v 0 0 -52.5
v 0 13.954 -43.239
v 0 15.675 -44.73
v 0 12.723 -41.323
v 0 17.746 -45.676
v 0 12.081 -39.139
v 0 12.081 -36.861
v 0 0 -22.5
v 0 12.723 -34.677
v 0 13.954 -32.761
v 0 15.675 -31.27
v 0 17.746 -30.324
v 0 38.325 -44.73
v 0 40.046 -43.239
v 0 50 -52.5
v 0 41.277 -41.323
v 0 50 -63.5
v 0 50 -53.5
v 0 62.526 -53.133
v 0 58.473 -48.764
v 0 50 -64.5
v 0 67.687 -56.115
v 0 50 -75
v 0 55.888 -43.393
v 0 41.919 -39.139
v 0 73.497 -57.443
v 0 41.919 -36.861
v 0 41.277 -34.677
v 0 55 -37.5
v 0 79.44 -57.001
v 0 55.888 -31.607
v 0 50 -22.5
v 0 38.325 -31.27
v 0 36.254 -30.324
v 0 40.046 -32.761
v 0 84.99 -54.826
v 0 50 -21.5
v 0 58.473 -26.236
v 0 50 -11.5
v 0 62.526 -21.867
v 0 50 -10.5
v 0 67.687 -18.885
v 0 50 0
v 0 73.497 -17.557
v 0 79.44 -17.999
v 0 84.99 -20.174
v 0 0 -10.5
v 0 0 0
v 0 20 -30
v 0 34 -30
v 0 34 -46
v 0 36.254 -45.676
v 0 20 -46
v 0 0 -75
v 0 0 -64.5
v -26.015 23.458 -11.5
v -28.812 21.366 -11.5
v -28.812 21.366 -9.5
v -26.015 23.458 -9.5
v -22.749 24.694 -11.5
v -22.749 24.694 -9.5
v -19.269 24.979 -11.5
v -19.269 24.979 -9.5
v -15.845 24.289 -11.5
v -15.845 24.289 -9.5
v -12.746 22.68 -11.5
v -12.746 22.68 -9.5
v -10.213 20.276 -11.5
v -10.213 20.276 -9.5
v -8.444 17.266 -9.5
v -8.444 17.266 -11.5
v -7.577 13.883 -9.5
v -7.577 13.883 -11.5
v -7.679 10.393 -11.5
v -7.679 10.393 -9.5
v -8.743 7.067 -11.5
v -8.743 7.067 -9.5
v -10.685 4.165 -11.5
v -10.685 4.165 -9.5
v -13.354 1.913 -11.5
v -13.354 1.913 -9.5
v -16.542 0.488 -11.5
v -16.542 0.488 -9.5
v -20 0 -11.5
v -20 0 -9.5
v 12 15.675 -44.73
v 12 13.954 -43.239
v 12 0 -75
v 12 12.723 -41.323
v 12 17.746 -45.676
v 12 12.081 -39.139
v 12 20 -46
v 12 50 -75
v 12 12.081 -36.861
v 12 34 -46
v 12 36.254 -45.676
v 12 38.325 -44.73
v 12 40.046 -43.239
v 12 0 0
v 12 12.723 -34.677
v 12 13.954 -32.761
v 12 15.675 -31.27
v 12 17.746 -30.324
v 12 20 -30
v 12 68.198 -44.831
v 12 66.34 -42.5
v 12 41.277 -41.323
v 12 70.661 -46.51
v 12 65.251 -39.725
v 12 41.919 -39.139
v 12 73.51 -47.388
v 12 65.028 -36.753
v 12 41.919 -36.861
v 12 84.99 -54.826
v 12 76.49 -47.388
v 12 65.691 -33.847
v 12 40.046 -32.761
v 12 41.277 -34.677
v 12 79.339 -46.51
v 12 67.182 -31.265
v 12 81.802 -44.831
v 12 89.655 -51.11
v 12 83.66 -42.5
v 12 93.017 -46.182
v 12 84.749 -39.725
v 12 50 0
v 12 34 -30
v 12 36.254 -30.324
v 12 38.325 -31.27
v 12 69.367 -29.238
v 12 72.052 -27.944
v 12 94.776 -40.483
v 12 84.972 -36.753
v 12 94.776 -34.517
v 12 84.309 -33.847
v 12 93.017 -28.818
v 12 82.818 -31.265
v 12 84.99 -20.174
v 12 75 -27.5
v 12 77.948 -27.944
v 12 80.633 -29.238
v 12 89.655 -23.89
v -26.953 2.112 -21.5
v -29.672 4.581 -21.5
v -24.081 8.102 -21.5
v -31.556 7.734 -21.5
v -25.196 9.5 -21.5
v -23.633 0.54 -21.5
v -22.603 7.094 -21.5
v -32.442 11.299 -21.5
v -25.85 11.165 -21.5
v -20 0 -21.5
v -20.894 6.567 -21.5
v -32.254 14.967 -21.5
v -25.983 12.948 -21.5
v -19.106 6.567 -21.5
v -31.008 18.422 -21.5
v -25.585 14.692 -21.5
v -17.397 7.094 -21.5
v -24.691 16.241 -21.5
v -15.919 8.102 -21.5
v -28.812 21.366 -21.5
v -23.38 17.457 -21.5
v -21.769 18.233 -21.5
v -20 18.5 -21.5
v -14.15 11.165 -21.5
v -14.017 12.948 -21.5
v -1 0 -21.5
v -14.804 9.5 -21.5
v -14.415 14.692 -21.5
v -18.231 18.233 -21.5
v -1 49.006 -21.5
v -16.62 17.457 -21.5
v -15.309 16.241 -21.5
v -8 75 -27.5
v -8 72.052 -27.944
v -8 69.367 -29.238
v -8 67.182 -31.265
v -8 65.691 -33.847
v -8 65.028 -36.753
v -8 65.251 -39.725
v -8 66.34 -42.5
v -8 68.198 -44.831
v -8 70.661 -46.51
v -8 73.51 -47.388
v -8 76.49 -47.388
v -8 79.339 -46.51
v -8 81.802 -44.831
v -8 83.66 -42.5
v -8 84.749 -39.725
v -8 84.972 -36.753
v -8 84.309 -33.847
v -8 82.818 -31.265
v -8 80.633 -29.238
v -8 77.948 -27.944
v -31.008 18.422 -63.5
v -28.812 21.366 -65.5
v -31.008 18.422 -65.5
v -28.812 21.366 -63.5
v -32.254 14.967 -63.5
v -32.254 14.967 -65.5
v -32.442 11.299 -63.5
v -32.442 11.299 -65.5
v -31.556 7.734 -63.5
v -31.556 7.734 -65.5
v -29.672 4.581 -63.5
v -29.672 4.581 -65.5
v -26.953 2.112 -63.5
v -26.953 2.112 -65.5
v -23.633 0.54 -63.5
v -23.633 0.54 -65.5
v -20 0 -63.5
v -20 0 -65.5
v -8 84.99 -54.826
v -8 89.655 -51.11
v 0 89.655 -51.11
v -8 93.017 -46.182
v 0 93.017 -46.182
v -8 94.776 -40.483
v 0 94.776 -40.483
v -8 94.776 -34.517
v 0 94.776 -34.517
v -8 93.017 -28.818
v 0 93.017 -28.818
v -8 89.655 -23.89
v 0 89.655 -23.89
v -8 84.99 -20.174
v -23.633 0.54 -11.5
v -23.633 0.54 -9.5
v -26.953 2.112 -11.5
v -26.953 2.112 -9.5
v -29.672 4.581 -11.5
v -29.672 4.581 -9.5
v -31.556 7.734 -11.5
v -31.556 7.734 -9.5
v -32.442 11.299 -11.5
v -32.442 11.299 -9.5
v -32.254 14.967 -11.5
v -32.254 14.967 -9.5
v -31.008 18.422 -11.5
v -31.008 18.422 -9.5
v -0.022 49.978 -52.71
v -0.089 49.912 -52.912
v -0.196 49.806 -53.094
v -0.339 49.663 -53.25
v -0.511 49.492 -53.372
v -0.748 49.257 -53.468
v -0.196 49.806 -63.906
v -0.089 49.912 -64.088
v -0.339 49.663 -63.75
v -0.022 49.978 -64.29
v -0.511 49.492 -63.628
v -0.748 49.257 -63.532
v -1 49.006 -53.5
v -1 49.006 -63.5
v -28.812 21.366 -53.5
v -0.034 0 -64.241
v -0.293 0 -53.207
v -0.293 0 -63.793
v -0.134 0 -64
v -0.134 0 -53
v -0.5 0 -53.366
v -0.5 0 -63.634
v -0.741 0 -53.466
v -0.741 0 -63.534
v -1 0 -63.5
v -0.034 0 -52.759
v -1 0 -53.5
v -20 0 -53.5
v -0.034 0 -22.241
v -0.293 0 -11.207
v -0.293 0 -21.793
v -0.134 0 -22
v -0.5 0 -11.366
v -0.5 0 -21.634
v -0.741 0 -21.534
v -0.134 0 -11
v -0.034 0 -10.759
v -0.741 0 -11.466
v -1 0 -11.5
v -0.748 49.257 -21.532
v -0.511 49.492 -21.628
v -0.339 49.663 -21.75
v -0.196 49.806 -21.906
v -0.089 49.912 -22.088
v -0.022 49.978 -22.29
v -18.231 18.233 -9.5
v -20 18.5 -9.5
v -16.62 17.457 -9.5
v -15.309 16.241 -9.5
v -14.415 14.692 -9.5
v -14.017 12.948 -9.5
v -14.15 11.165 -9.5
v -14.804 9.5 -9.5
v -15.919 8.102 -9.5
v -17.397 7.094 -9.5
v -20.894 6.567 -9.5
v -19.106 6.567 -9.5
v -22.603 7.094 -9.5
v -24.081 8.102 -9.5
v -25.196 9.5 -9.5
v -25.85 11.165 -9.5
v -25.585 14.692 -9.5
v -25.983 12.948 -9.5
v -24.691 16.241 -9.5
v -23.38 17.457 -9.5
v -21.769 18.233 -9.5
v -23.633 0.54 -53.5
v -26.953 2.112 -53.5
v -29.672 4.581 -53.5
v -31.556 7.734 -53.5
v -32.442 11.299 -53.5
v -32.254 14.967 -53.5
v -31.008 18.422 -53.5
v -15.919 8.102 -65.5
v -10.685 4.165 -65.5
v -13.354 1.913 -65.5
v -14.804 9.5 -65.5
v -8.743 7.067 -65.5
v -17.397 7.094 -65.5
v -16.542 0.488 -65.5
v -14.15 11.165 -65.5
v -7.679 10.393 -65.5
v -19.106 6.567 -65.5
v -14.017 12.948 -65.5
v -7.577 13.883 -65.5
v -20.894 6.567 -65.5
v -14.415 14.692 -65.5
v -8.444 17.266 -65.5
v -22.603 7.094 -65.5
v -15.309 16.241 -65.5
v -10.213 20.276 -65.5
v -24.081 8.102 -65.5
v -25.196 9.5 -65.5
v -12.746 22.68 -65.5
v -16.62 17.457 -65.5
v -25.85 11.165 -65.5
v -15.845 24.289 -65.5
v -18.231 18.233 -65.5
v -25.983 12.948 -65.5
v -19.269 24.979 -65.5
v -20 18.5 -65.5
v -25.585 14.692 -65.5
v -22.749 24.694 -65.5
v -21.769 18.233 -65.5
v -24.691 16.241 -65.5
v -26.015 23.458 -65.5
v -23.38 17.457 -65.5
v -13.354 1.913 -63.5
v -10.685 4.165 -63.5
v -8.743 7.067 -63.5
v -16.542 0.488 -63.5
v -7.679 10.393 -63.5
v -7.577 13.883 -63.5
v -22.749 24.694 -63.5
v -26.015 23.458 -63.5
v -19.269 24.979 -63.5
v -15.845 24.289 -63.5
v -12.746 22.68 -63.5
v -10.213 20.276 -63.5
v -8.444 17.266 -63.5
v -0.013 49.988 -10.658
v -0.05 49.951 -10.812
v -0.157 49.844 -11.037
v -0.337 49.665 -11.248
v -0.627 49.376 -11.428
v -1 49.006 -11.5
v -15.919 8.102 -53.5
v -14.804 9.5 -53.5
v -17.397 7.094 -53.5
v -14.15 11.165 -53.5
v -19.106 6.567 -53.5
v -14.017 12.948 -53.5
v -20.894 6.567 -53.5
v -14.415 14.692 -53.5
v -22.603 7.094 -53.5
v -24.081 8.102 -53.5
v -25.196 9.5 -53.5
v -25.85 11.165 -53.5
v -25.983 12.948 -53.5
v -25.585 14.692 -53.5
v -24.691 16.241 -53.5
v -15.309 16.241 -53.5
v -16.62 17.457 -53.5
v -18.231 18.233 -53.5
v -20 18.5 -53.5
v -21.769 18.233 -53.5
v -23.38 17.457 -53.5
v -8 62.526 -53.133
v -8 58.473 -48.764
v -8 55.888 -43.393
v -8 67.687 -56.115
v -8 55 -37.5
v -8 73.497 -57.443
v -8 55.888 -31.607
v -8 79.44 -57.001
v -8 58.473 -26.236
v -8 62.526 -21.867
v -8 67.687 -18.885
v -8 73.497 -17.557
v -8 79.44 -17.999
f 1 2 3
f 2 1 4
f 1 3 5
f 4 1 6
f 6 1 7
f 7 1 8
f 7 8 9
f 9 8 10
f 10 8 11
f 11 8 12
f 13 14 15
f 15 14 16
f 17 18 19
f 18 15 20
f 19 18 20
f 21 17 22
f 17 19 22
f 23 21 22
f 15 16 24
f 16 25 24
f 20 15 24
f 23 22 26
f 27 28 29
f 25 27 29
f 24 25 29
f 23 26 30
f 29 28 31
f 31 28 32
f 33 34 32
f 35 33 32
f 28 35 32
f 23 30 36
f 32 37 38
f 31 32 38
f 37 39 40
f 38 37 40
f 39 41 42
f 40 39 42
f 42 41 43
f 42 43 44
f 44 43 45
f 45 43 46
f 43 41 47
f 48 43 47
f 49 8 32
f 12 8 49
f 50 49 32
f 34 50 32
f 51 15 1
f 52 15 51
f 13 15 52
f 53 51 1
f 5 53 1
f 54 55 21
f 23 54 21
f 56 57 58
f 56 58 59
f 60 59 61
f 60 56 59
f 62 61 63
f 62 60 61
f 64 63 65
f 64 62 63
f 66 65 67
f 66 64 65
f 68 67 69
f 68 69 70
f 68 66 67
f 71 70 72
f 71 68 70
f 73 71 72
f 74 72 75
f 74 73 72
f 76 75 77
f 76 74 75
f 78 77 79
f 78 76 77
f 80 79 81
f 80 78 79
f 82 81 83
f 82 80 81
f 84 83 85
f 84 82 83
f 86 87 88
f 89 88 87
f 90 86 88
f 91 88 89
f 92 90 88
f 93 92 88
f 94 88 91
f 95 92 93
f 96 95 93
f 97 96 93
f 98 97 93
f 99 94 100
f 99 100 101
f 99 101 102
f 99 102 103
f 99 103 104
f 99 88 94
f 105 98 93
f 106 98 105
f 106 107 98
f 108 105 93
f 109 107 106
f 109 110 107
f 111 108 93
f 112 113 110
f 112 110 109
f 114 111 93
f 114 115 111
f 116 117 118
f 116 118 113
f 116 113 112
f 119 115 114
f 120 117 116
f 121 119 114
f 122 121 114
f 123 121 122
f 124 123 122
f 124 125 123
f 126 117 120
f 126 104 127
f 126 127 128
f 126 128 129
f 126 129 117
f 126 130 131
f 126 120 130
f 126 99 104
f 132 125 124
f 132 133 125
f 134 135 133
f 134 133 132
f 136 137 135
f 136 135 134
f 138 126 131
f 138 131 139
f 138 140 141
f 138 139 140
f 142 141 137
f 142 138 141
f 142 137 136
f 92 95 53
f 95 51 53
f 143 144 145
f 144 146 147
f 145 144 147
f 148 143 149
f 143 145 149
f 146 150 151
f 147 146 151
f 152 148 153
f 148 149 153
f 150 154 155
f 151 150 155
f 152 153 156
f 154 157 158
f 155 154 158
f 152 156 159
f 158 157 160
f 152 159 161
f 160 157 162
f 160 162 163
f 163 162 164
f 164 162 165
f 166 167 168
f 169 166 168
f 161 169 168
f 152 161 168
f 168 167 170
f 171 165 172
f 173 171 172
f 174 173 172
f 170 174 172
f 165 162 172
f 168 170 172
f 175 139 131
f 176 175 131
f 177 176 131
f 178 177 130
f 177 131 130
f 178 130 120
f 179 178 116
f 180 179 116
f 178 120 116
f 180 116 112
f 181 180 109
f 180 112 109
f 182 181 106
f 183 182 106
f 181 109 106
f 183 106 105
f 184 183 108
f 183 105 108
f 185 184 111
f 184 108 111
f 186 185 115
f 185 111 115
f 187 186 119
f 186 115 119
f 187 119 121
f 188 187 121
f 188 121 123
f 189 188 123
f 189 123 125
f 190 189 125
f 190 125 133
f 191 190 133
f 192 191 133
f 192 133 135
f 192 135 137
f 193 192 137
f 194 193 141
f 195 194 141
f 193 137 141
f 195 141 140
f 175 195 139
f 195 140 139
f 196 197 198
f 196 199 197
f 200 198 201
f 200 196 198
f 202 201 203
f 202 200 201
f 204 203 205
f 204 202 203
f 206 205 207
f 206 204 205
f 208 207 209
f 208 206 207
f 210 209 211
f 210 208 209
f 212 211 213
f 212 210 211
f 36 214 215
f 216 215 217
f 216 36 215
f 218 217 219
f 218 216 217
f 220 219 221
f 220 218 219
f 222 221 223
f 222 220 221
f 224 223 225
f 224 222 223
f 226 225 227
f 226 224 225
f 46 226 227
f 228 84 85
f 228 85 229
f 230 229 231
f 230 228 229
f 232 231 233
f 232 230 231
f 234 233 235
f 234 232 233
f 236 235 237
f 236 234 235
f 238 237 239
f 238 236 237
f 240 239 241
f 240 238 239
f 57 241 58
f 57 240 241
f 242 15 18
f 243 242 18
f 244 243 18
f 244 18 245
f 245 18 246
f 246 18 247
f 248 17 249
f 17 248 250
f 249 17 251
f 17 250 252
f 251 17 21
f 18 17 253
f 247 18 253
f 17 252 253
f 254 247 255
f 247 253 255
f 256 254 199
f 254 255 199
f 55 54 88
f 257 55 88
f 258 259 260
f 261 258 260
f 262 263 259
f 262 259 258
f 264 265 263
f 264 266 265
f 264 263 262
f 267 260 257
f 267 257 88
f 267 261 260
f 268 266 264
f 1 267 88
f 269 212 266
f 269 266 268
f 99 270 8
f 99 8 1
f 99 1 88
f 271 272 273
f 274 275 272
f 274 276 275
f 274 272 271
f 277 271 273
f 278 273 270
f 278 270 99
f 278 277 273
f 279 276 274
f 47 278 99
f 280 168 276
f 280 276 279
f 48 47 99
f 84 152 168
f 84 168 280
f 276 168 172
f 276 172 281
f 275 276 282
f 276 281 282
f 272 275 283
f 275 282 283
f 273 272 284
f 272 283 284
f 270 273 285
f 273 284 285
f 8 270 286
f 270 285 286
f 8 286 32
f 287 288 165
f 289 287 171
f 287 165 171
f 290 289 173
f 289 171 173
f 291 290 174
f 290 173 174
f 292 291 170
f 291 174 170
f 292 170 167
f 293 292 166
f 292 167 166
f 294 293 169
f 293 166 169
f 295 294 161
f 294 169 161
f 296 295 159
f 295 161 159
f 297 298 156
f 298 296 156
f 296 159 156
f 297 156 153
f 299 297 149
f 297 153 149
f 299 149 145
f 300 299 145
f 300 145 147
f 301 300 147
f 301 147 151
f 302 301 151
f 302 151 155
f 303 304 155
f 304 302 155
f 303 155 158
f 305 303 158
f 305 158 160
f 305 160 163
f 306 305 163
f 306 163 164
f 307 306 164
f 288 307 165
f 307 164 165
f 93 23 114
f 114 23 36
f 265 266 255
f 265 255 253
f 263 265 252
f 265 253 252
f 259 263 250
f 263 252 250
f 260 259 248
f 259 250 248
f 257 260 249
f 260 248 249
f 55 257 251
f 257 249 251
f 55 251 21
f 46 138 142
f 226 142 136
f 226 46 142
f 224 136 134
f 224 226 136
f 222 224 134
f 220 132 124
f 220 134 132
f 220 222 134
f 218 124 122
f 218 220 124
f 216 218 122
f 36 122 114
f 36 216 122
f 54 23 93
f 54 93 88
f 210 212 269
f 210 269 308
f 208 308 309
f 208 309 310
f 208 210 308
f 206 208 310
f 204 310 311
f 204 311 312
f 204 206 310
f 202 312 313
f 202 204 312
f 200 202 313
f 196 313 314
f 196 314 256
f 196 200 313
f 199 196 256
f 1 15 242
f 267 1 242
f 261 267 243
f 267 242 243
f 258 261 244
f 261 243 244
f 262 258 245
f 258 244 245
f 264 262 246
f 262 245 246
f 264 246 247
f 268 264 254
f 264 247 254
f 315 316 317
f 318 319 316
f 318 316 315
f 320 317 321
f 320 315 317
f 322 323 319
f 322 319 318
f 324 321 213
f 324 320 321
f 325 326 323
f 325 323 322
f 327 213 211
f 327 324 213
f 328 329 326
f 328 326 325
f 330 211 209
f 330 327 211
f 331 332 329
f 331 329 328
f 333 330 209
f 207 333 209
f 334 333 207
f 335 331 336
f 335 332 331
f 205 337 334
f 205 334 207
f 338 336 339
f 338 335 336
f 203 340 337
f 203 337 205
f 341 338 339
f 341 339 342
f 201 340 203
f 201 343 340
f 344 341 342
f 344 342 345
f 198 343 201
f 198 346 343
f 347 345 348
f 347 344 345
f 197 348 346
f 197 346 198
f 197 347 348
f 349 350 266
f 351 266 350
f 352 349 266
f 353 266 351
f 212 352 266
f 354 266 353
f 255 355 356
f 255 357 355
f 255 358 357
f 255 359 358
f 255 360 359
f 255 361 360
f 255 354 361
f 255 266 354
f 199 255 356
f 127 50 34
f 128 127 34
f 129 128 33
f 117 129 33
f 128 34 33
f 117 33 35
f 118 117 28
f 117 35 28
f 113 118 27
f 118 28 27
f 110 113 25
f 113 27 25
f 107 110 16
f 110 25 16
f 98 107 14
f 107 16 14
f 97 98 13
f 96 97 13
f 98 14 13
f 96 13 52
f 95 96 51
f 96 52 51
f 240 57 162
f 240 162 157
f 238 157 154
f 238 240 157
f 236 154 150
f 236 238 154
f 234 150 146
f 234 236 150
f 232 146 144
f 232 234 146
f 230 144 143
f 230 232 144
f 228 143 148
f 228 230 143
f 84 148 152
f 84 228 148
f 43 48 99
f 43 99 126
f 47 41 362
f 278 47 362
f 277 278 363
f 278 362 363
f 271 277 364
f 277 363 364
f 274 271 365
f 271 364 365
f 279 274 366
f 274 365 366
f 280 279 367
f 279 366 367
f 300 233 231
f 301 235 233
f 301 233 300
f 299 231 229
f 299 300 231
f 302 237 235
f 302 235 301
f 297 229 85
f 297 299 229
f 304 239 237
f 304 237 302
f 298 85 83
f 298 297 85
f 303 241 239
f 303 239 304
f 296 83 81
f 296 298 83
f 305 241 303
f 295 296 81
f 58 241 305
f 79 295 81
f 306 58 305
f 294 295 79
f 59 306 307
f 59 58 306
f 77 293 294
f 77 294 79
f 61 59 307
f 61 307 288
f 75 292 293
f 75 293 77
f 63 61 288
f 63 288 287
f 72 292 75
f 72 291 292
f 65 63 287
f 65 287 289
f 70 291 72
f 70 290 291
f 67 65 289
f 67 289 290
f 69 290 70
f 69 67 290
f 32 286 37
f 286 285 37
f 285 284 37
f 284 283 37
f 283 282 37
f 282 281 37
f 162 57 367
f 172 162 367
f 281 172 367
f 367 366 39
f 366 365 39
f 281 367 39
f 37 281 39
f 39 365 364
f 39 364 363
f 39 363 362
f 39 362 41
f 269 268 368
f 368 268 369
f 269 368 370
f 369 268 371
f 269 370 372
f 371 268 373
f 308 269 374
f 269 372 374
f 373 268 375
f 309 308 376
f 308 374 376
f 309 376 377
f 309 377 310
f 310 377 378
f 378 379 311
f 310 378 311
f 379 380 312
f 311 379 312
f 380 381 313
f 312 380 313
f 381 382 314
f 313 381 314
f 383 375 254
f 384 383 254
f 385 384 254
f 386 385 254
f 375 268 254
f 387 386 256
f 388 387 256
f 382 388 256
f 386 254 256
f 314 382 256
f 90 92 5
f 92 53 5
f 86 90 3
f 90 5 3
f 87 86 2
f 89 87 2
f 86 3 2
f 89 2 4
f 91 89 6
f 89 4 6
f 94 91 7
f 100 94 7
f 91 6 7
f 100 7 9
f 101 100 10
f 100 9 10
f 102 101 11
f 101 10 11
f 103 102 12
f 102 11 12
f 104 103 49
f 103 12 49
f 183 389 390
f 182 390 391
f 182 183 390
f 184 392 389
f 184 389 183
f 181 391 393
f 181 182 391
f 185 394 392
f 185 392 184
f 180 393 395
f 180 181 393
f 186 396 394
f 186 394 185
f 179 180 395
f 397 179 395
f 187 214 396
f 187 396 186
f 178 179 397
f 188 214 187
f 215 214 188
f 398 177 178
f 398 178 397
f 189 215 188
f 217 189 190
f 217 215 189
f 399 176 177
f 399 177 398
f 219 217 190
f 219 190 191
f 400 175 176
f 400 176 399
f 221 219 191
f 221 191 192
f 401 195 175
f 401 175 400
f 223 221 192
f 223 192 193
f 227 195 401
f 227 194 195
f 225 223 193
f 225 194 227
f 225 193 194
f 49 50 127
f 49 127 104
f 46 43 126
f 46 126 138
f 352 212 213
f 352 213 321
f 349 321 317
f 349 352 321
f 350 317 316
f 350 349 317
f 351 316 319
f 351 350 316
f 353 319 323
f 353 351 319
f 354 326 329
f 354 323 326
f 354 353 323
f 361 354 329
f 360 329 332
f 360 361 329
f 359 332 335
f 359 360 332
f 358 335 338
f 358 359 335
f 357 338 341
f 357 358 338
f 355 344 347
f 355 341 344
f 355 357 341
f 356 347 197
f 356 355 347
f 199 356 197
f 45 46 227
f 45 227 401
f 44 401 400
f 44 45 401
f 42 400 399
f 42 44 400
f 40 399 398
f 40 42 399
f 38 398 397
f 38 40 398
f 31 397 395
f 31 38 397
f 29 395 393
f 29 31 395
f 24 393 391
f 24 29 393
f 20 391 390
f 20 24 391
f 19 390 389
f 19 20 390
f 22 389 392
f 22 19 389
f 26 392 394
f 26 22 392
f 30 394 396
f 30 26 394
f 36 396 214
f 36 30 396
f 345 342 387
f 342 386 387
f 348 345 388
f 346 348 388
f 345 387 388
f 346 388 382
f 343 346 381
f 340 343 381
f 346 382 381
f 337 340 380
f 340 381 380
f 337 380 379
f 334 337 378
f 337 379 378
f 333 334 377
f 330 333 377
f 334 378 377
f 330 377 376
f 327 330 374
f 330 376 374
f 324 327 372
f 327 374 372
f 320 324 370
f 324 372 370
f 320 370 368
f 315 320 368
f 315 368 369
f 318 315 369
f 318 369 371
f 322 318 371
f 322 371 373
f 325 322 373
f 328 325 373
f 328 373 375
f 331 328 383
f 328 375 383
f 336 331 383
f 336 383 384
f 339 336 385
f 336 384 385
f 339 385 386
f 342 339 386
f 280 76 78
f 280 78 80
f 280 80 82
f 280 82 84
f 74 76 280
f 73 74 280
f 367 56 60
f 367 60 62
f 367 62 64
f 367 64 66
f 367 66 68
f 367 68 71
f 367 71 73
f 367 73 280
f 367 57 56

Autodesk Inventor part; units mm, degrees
ref_plane "YZ Plane" through (0, 0, 0) normal (1, 0, 0) x (0, 1, 0)
ref_plane "XZ Plane" through (0, 0, 0) normal (0, 1, 0) x (-1, 0, 0)
ref_plane "XY Plane" through (0, 0, 0) normal (0, 0, 1) x (1, 0, 0)
sketch "Szkic1" plane through (0, 0, 0) normal (1, 0, 0) x (0, 1, 0)
  line L0 (0, 0) -> (50, 0)
  line L1 (50, 0) -> (50, -75)
  line L2 (50, -75) -> (0, -75)
  line L3 (0, -75) -> (0, 0)
  circle A0 centre (75, -37.5) radius 20
  line L4 (50, 0) -> (84.9897, -20.1735)
  line L5 (50, -75) -> (84.9897, -54.8265)
  dimension "d0" = 50
  dimension "d1" = 75
  dimension "d2" = 40
  dimension "d3" = 25
  dimension "d4" = 37.5
extrude "Wyciągnięcie proste1" add sketch "Szkic1" along normal blind 12
sketch "Szkic2" plane through (12, 0, 0) normal (1, 0, 0) x (0, 0, -1)
  point P0 (0, 0)
sketch "Szkic3" plane through (0, 0, 0) normal (-1, 0, 0) x (0, 0, 1)
  arc A0 (-20.1735, 84.9897) -> (-54.8265, 84.9897) centre (-37.5, 75) ccw projected
  circle A1 centre (-37.5, 75) radius 20
  point P0 (0, 0)
  point P1 (-54.8265, 84.9897)
  point P2 (-20.1735, 84.9897)
  dimension "d7" = 40
extrude "Wyciągnięcie proste2" add sketch "Szkic3" along normal blind 8
sketch "Szkic4" plane through (0, 0, 0) normal (-1, 0, 0) x (0, 0, 1)
  circle A0 centre (-38, 34) radius 8
  circle A1 centre (-38, 20) radius 8
  line L0 (-46, 34) -> (-46, 20)
  line L1 (-30, 34) -> (-30, 20)
  line L2 (0, 0) -> (-75, 0) projected
  dimension "d10" = 16
  dimension "d11" = 16
  dimension "d12" = 14
  dimension "d13" = 20
extrude "Wyciągnięcie proste3" cut sketch "Szkic4" against normal through all
sketch "Szkic5" plane through (-8, 75, -37.5) normal (-1, 0, 0) x (0, 0, 1)
  point P0 (37.5, -75)
  point P1 (0, 0)
hole "Otwór1" at (-8, 75, -37.5) direction (1, 0, 0) diameter 20 end through all
ref_plane "Płaszczyzna konstrukcyjna1" through (0, 0, -63.5) normal (0, 0, -1) x (-1, 0, 0)
sketch "Szkic6" plane through (0, 0, -63.5) normal (0, 0, -1) x (-1, 0, 0)
  circle A0 centre (20, 12.5) radius 12.5
  line L0 (0, 50) -> (-12, 50) projected
  line L1 (0, 50) -> (28.8115, 21.3661)
  line L2 (0, 0) -> (0, 50) projected
  line L3 (0, 0) -> (20, 0)
  dimension "d24" = 25
  dimension "d25" = 20
extrude "Wyciągnięcie proste4" add sketch "Szkic6" against normal blind 10
ref_plane "Płaszczyzna konstrukcyjna2" through (0, 0, -37.5) normal (0, 0, -1) x (-1, 0, 0)
sketch "Szkic7" plane through (0, 0, -63.5) normal (0, 0, -1) x (-1, 0, 0)
  arc A0 (20, 0) -> (28.8115, 21.3661) centre (20, 12.5) ccw projected
  circle A1 centre (20, 12.5) radius 12.5
  point P0 (0, 0)
  dimension "d28" = 25
extrude "Wyciągnięcie proste5" add sketch "Szkic7" along normal blind 2
sketch "Szkic8" plane through (-20, 12.5, -65.5) normal (0, 0, -1) x (-1, 0, 0)
  point P0 (-20, -12.5)
  point P1 (0, 0)
hole "Otwór2" at (-20, 12.5, -65.5) direction (0, 0, 1) diameter 12 end through all
mirror "Odbij1" about plane through (0, 0, -37.5) normal (0, 0, -1) of "Wyciągnięcie proste4", "Wyciągnięcie proste5", "Otwór2"
fillet "Zaokrąglenie1" radius 1 4 edges at (0, 25, -63.5) (0, 25, -21.5) (0, 25, -11.5) (0, 25, -53.5)
